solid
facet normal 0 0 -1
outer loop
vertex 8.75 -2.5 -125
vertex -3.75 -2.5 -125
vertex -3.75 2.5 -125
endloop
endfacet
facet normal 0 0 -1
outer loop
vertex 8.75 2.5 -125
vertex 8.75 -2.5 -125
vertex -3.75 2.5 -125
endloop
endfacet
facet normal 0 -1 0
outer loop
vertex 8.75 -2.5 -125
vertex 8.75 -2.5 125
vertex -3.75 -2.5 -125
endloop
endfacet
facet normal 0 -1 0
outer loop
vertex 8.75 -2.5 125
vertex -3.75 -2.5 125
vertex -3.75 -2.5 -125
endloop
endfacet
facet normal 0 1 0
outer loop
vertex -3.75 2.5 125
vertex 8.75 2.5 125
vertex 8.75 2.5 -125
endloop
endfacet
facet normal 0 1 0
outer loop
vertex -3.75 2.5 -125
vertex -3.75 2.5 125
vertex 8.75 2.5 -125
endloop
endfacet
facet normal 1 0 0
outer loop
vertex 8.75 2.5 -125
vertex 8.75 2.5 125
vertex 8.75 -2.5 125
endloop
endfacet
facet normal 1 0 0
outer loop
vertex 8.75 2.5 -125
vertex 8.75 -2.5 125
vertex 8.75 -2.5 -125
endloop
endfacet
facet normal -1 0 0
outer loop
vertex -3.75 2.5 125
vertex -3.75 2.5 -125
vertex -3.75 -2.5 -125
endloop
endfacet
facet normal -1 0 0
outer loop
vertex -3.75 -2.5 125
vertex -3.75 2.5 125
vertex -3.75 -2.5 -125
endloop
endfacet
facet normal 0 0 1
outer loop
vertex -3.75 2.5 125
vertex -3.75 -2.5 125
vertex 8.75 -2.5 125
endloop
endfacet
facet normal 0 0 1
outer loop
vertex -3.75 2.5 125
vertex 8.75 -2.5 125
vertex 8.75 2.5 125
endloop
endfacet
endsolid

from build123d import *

# Parameters (mm, degrees)
CROQUIS1_R                   = 2.5
SALIENTE_EXTRUIR1_DEPTH      = 1.25
SALIENTE_EXTRUIR4_DEPTH      = 2.5
CROQUIS6_R                   = 12.525
CORTAR_EXTRUIR3_DEPTH        = 10
SALIENTE_EXTRUIR5_DEPTH      = 200
CROQUIS8_R                   = 12.525
SALIENTE_EXTRUIR6_DEPTH      = 21
CROQUIS10_W                  = 18.5
CROQUIS10_H                  = 25.138120499
CROQUIS10_W_2                = 2.5
CROQUIS10_H_2                = 4.861879501
CROQUIS10_H_3                = 5
CORTAR_EXTRUIR5_DEPTH        = 98
SALIENTE_EXTRUIR7_DEPTH      = 50
SALIENTE_EXTRUIR8_DEPTH      = 15
SALIENTE_EXTRUIR8_DEPTH_BACK = 265
CROQUIS15_W                  = 250
CROQUIS15_H                  = 5
CROQUIS15_W_2                = 280
SALIENTE_EXTRUIR9_DEPTH      = 7.5
CROQUIS16_W                  = 280
CROQUIS16_H                  = 5
CROQUIS16_W_2                = 250
CROQUIS16_H_2                = 30.3
CORTAR_EXTRUIR6_DEPTH        = 86


with BuildPart() as part:
    # Croquis1 → Saliente-Extruir1 (new, symmetric)
    with BuildSketch(Plane(origin=(0, 0, 0), x_dir=(0, 0, -1), z_dir=(1, 0, 0))):
        with BuildLine():
            Line((125, -2.5), (-125, -2.5))
            Line((-125, -2.5), (-125, 2.5))
            Line((-125, 2.5), (-123, 2.5))
            Line((-123, 2.5), (-117, 17.5))
            ThreePointArc((-117, 17.5), (-110, 24.5), (-103, 17.5))
            Line((-103, 17.5), (-97, 2.5))
            Line((-97, 2.5), (125, 2.5))
            Line((125, 2.5), (125, -2.5))
        make_face()
        with Locations((-110, 17.5)):
            Circle(CROQUIS1_R, mode=Mode.SUBTRACT)
    extrude(amount=SALIENTE_EXTRUIR1_DEPTH, both=True)

    # Croquis5 → Saliente-Extruir4 (add, through all)
    with BuildSketch(Plane(origin=(1.25, 0, 0), x_dir=(0, 0, -1), z_dir=(1, 0, 0))):
        with BuildLine():
            ThreePointArc((-100, 10), (-110, 5), (-120, 10))
            Line((-120, 10), (-121.0552482, 7.361879501))
            ThreePointArc((-121.0552482, 7.361879501), (-110, 2.5), (-98.9447518, 7.361879501))
            Line((-98.9447518, 7.361879501), (-100, 10))
        make_face()
        with BuildLine():
            Line((-121.0552482, 7.361879501), (-120, 10))
            ThreePointArc((-120, 10), (-113.952847075, 29.358541226), (-97.5, 17.5))
            ThreePointArc((-97.5, 17.5), (-98.141458774, 13.547152925), (-100, 10))
            Line((-100, 10), (-98.9447518, 7.361879501))
            ThreePointArc((-98.9447518, 7.361879501), (-96.020931308, 12.060731804), (-95, 17.5))
            ThreePointArc((-95, 17.5), (-115.439268196, 31.479068692), (-121.0552482, 7.361879501))
        make_face()
    extrude(amount=-SALIENTE_EXTRUIR4_DEPTH)

    # Croquis6 → Cortar-Extruir3 (cut)
    with BuildSketch(Plane(origin=(1.25, 0, 0), x_dir=(0, 0, -1), z_dir=(1, 0, 0))):
        with Locations((-110, 17.5)):
            Circle(CROQUIS6_R)
    extrude(amount=-CORTAR_EXTRUIR3_DEPTH, mode=Mode.SUBTRACT)

    # Croquis7 → Saliente-Extruir5 (add)
    with BuildSketch(Plane(origin=(0, 0, -125), x_dir=(-1, 0, 0), z_dir=(0, 0, -1))):
        Polygon((3.75, 37.8), (3.75, -2.5), (1.25, -2.5), (1.25, 2.5), (1.25, 32.8), (-1.25, 32.8), (-1.25, 37.8), align=None)
    extrude(amount=-SALIENTE_EXTRUIR5_DEPTH)

    # Croquis8 → Saliente-Extruir6 (add)
    with BuildSketch(Plane.ZY.offset(1.25)):
        with BuildLine():
            Line((98.9447518, 7.361879501), (97, 2.5))
            Line((97, 2.5), (95, 2.5))
            Line((95, 2.5), (95, -2.5))
            Line((95, -2.5), (125, -2.5))
            Line((125, -2.5), (125, 2.5))
            Line((125, 2.5), (123, 2.5))
            Line((123, 2.5), (121.0552482, 7.361879501))
            ThreePointArc((121.0552482, 7.361879501), (110, 32.5), (98.9447518, 7.361879501))
        make_face()
        with Locations(Location((110, 17.5, 0), (0, 0, 180))):
            Circle(CROQUIS8_R, mode=Mode.SUBTRACT)
    extrude(amount=SALIENTE_EXTRUIR6_DEPTH)

    # Croquis10 → Cortar-Extruir5 (cut)
    with BuildSketch(Plane.XY.offset(75)):
        with Locations((-13, 19.930939751)):
            Rectangle(CROQUIS10_W, CROQUIS10_H)
        Polygon((1.25, 37.8), (-3.75, 37.8), (-3.75, 32.5), (-1.25, 32.5), (-1.25, 32.8), (1.25, 32.8), align=None)
        with Locations((0, 19.930939751)):
            Rectangle(CROQUIS10_W_2, CROQUIS10_H)
        with Locations((-2.5, 19.930939751)):
            Rectangle(CROQUIS10_W_2, CROQUIS10_H)
        with Locations((-13, 4.930939751)):
            Rectangle(CROQUIS10_W, CROQUIS10_H_2)
        with Locations((-2.5, 4.930939751)):
            Rectangle(CROQUIS10_W_2, CROQUIS10_H_2)
        with Locations((0, 4.930939751)):
            Rectangle(CROQUIS10_W_2, CROQUIS10_H_2)
        with Locations((-2.5, 0)):
            Rectangle(CROQUIS10_W_2, CROQUIS10_H_3)
        with Locations((-13, 0)):
            Rectangle(CROQUIS10_W, CROQUIS10_H_3)
        Rectangle(CROQUIS10_W_2, CROQUIS10_H_3)
    extrude(amount=CORTAR_EXTRUIR5_DEPTH, mode=Mode.SUBTRACT)

    # Croquis11 → Saliente-Extruir7 (add)
    with BuildSketch(Plane.XY.offset(75)):
        Polygon((-3.75, 37.8), (-3.75, -2.5), (1.25, -2.5), (1.25, 2.5), (-1.25, 2.5), (-1.25, 32.8), (1.25, 32.8), (1.25, 37.8), align=None)
    extrude(amount=SALIENTE_EXTRUIR7_DEPTH)

    # Croquis14 → Saliente-Extruir8 (add, two sides: drawn at the far end of the back side and taken through both)
    with BuildSketch(Plane.XY.offset(125).offset(-SALIENTE_EXTRUIR8_DEPTH_BACK)):
        Polygon((-1.25, 32.8), (1.25, 32.8), (1.25, 37.8), (-3.75, 37.8), (-3.75, 32.8), align=None)
    extrude(amount=SALIENTE_EXTRUIR8_DEPTH + SALIENTE_EXTRUIR8_DEPTH_BACK)

    # Croquis15 → Saliente-Extruir9 (add)
    with BuildSketch(Plane(origin=(1.25, 0, 0), x_dir=(0, 0, -1), z_dir=(1, 0, 0))):
        Rectangle(CROQUIS15_W, CROQUIS15_H)
        with Locations((0, 35.3)):
            Rectangle(CROQUIS15_W_2, CROQUIS15_H)
    extrude(amount=SALIENTE_EXTRUIR9_DEPTH)

    # Croquis16 → Cortar-Extruir6 (cut)
    with BuildSketch(Plane(origin=(-1.25, 0, 0), x_dir=(0, 0, -1), z_dir=(1, 0, 0))):
        with Locations((0, 35.3)):
            Rectangle(CROQUIS16_W, CROQUIS16_H)
        with Locations((0, 17.65)):
            Rectangle(CROQUIS16_W_2, CROQUIS16_H_2)
    extrude(amount=-CORTAR_EXTRUIR6_DEPTH, mode=Mode.SUBTRACT)


with BuildPart() as cortar_extruir6_piece_1:
    # of the separate pieces the step leaves, piece 1, a body of its own (cortar_extruir6_pieces)
    add(part.part.solids().sort_by_distance((-3.75, -2.5, -125))[0])


with BuildPart() as cortar_extruir6_piece_2:
    # of the separate pieces the step leaves, piece 2, a body of its own (cortar_extruir6_pieces)
    add(part.part.solids().sort_by_distance((-1.25, 32.8, -140))[0])


solid = cortar_extruir6_piece_1.part
